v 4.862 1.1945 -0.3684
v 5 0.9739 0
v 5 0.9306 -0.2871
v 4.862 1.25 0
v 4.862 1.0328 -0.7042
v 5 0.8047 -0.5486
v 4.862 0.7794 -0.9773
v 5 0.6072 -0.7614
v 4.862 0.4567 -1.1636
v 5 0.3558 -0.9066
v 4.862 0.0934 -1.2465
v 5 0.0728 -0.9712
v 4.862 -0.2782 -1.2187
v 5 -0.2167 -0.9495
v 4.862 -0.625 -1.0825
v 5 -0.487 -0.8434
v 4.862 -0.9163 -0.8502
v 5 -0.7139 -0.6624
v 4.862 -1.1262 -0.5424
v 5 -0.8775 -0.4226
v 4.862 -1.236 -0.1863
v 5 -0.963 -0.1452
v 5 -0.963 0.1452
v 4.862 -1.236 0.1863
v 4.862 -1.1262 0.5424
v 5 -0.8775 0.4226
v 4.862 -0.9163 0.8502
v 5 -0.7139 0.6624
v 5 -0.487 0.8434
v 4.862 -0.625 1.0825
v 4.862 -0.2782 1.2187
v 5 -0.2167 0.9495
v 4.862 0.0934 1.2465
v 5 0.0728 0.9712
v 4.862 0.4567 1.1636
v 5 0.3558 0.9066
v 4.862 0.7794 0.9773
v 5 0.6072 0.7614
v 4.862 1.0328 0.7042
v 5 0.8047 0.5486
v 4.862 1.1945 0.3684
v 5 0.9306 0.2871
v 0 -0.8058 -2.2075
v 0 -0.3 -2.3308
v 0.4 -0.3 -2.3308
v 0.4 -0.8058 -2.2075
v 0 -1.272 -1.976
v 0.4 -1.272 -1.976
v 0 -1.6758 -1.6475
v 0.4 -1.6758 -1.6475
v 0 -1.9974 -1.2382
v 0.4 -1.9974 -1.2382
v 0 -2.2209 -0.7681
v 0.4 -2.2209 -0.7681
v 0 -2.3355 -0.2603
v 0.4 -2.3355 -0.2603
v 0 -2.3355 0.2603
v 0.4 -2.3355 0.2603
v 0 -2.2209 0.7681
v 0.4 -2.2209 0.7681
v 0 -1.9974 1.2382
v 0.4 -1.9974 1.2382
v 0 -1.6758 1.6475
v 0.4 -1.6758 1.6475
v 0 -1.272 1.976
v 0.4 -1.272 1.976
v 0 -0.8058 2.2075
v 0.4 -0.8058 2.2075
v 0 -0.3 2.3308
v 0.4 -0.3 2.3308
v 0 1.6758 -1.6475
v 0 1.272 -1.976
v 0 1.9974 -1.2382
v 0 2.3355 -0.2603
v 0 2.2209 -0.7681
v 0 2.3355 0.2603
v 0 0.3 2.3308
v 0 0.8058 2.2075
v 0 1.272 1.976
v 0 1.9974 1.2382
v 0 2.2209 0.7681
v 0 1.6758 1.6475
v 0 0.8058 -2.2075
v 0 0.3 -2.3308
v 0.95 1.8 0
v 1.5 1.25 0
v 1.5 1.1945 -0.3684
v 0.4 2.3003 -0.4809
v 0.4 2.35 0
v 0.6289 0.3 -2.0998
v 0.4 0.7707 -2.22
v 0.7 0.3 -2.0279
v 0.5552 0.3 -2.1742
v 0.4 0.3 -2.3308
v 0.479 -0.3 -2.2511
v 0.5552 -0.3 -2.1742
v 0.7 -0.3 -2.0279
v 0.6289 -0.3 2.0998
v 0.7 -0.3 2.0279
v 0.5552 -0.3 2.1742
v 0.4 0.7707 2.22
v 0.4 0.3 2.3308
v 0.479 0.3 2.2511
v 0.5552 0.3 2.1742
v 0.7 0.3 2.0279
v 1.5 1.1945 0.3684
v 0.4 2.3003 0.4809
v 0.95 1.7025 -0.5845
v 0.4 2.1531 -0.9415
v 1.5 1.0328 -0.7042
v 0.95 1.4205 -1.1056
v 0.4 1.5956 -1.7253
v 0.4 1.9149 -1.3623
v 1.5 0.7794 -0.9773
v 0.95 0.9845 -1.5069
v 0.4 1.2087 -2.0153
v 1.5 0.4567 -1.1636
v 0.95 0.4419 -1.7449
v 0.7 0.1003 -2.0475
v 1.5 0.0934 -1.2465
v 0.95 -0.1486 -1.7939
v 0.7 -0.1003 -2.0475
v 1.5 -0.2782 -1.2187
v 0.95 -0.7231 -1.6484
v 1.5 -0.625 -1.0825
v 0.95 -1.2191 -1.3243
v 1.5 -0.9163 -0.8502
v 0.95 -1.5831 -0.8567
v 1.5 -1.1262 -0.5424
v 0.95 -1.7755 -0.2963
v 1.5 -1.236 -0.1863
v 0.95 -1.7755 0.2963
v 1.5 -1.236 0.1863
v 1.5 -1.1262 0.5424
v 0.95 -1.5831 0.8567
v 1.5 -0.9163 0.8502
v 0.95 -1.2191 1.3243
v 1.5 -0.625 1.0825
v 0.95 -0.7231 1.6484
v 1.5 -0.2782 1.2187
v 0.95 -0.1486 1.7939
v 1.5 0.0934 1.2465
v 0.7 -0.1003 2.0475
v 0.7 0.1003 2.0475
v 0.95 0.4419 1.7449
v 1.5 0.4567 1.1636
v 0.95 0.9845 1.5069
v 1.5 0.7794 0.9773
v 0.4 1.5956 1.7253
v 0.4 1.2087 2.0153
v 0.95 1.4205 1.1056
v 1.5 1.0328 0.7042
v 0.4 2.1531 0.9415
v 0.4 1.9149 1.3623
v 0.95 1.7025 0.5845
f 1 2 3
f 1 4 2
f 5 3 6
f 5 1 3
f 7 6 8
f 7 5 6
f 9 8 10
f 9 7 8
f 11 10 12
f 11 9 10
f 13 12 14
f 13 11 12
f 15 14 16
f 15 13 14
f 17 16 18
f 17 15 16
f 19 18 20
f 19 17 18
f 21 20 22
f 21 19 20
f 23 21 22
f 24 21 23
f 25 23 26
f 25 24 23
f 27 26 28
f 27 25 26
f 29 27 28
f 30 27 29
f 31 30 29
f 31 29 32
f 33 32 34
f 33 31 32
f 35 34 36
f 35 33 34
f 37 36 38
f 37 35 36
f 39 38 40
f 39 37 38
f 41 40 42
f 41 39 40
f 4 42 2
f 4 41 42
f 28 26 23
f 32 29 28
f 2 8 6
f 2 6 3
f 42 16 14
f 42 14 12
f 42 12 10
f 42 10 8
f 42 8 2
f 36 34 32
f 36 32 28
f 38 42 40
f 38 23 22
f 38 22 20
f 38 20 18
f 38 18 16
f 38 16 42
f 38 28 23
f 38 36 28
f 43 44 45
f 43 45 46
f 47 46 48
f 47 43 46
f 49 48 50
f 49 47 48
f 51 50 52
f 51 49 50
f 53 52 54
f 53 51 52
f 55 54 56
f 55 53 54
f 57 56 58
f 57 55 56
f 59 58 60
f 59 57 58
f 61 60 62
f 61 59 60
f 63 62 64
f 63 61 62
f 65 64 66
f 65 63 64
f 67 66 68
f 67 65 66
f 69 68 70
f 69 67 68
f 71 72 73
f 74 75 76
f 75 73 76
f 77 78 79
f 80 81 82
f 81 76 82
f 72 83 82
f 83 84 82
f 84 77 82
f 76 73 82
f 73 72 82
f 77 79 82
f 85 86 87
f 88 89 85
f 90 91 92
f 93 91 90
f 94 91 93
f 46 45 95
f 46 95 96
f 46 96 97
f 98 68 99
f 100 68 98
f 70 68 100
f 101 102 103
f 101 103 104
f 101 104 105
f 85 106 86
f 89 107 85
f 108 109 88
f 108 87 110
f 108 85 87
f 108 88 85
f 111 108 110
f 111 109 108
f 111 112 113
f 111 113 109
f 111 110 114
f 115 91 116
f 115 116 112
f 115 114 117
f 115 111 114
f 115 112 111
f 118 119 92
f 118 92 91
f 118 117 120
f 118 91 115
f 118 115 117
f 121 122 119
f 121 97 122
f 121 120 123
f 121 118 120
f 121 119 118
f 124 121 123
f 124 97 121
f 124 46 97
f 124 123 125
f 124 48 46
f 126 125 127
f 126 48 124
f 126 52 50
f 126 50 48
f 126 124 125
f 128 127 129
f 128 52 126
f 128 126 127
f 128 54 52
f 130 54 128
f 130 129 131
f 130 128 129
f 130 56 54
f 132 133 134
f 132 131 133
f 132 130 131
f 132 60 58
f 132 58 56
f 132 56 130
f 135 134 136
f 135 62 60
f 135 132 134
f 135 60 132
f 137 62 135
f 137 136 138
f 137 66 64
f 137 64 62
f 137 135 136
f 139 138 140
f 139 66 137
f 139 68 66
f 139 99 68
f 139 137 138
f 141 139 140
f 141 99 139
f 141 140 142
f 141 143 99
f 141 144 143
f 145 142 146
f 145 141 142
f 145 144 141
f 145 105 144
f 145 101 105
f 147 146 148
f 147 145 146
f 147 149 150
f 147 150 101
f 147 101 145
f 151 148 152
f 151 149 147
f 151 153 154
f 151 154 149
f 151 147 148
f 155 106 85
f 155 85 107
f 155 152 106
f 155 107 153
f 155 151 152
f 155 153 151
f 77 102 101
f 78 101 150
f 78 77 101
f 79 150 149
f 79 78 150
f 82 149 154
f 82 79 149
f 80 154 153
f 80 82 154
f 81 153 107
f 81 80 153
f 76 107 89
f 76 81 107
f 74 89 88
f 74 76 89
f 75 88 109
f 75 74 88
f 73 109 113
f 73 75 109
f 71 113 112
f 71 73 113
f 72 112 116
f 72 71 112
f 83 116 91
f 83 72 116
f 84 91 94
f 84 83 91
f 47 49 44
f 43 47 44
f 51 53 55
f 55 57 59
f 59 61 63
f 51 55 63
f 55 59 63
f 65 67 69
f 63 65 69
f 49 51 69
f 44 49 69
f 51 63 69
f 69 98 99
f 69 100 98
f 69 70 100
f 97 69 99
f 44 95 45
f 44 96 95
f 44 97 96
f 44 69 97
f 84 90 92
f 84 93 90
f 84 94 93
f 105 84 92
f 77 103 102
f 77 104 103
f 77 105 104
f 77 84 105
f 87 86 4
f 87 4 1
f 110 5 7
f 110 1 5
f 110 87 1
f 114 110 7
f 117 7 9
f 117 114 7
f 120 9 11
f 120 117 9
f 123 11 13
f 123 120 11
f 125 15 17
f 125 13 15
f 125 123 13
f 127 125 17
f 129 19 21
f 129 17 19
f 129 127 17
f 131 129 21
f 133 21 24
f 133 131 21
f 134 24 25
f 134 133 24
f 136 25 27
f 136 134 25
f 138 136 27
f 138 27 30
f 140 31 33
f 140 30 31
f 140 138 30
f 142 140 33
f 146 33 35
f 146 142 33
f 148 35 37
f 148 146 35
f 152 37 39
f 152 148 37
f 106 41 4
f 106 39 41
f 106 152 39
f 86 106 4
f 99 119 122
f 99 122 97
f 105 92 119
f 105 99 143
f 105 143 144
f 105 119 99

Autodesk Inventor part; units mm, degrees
ref_plane "YZ Plane" through (0, 0, 0) normal (1, 0, 0) x (0, 1, 0)
ref_plane "XZ Plane" through (0, 0, 0) normal (0, 1, 0) x (-1, 0, 0)
sketch "Skizze1" plane through (0, 0, 0) normal (0, 0, 1) x (1, 0, 0)
  line L0 (0, 0) -> (5, 0)
  line L1 (5, 0) -> (5, 1.25)
  line L2 (5, 1.25) -> (2.4, 1.25)
  line L3 (2.4, 1.25) -> (2.1239, 1.25)
  line L4 (2.1239, 1.25) -> (1.5, 1.25)
  line L5 (1.5, 1.25) -> (0.4, 2.35)
  line L6 (0.4, 2.35) -> (0, 2.35)
  line L7 (0, 2.35) -> (0, 0)
  line L8 (2.4, 1.25) -> (1.5, 1.25) construction
  line L9 (-1, 0) -> (6, 0) projected
  line L10 (0, 2.82) -> (0, -0.47) projected
  dimension "d0" = 5
  dimension "d1" = 45
  dimension "d2" = 0.2761
  dimension "d3" = 2.6
  dimension "d4" = 1.5
  dimension "d5" = 2.5
  dimension "d6" = 2.5
  dimension "d7" = 4.7
revolve "Körper" add sketch "Skizze1" angle 360 about axis through (0, 0, 0) along (1, 0, 0)
sketch "Skizze2" plane through (0, 0, 0) normal (-1, 0, 0) x (0, 0, 1)
  line L0 (2.35, -0.3) -> (-2.35, -0.3)
  line L1 (-2.35, -0.3) -> (-2.35, 0.3)
  line L2 (-2.35, 0.3) -> (2.35, 0.3)
  line L3 (2.35, 0.3) -> (2.35, -0.3)
  line L4 (0, 0.3) -> (0, -0.3) construction
  line L5 (-2.35, 0) -> (2.35, 0) construction
  line L6 (0, 2.35) -> (0, 0) projected
  dimension "d15" = 0.6
  dimension "d16" = 4.7
extrude "Loch" cut sketch "Skizze2" against normal blind 0.7
thread "Gewinde" size "M2.5x0.45" class "6g" standard "ISO Metric profile" length 2.6
chamfer "Fase1" distance 0.2761 distance2 0.138 1 edges at (5, -1.25, 0) measured on face at (5, -0.3689, 0.4922)
ref_plane "Work Plane1" through (33.575, 0, 0) normal (0, 0, -1) x (1, 0, 0)
equation "\"d0\" = NLG"
equation "\"d1\" = 0.5 * SEWI"
equation "\"d2\" = GAL"
equation "\"d3\" = GEL"
equation "\"d4\" = KOH"
equation "\"d5\" = BDM"
equation "\"d6\" = GD"
equation "\"d7\" = KOD"
equation "\"d15\" = SBR"
equation "\"d16\" = KOD"
equation "\"d8\" = STI"
equation "\"d10\" = GEL"
equation "\"d12\" = -0.5 * SPD + 0.5 * GD"
equation "\"d13\" = 0.5 * GAL"
equation "\"NLG\" = 5"
equation "\"GAL\" = 0.61345 * PTC"
equation "\"GEL\" = 2.6"
equation "\"KOH\" = 1.5"
equation "\"KOD\" = 4.7"
equation "\"SEWI\" = 90deg"
equation "\"BDM\" = NND"
equation "\"GD\" = NND"
equation "\"SBR\" = 0.6"
equation "\"STI\" = 0.7"
equation "\"SPD\" = NND - 1.2269 * PTC"
equation "\"GUL\" = 0.61345 * PTC"
equation "\"PTC\" = 0.45"
equation "\"EPV\" = 2.75"
equation "\"THREADDIA\" = 2.5"
equation "\"TOA\" = 30deg"
equation "\"NND\" = 2.5"
equation "\"GD1\" = THREADDIA - 1.2269 * PTC"
properties part number "DIN 963 - M2,5 x 5" material "Edelstahl"
